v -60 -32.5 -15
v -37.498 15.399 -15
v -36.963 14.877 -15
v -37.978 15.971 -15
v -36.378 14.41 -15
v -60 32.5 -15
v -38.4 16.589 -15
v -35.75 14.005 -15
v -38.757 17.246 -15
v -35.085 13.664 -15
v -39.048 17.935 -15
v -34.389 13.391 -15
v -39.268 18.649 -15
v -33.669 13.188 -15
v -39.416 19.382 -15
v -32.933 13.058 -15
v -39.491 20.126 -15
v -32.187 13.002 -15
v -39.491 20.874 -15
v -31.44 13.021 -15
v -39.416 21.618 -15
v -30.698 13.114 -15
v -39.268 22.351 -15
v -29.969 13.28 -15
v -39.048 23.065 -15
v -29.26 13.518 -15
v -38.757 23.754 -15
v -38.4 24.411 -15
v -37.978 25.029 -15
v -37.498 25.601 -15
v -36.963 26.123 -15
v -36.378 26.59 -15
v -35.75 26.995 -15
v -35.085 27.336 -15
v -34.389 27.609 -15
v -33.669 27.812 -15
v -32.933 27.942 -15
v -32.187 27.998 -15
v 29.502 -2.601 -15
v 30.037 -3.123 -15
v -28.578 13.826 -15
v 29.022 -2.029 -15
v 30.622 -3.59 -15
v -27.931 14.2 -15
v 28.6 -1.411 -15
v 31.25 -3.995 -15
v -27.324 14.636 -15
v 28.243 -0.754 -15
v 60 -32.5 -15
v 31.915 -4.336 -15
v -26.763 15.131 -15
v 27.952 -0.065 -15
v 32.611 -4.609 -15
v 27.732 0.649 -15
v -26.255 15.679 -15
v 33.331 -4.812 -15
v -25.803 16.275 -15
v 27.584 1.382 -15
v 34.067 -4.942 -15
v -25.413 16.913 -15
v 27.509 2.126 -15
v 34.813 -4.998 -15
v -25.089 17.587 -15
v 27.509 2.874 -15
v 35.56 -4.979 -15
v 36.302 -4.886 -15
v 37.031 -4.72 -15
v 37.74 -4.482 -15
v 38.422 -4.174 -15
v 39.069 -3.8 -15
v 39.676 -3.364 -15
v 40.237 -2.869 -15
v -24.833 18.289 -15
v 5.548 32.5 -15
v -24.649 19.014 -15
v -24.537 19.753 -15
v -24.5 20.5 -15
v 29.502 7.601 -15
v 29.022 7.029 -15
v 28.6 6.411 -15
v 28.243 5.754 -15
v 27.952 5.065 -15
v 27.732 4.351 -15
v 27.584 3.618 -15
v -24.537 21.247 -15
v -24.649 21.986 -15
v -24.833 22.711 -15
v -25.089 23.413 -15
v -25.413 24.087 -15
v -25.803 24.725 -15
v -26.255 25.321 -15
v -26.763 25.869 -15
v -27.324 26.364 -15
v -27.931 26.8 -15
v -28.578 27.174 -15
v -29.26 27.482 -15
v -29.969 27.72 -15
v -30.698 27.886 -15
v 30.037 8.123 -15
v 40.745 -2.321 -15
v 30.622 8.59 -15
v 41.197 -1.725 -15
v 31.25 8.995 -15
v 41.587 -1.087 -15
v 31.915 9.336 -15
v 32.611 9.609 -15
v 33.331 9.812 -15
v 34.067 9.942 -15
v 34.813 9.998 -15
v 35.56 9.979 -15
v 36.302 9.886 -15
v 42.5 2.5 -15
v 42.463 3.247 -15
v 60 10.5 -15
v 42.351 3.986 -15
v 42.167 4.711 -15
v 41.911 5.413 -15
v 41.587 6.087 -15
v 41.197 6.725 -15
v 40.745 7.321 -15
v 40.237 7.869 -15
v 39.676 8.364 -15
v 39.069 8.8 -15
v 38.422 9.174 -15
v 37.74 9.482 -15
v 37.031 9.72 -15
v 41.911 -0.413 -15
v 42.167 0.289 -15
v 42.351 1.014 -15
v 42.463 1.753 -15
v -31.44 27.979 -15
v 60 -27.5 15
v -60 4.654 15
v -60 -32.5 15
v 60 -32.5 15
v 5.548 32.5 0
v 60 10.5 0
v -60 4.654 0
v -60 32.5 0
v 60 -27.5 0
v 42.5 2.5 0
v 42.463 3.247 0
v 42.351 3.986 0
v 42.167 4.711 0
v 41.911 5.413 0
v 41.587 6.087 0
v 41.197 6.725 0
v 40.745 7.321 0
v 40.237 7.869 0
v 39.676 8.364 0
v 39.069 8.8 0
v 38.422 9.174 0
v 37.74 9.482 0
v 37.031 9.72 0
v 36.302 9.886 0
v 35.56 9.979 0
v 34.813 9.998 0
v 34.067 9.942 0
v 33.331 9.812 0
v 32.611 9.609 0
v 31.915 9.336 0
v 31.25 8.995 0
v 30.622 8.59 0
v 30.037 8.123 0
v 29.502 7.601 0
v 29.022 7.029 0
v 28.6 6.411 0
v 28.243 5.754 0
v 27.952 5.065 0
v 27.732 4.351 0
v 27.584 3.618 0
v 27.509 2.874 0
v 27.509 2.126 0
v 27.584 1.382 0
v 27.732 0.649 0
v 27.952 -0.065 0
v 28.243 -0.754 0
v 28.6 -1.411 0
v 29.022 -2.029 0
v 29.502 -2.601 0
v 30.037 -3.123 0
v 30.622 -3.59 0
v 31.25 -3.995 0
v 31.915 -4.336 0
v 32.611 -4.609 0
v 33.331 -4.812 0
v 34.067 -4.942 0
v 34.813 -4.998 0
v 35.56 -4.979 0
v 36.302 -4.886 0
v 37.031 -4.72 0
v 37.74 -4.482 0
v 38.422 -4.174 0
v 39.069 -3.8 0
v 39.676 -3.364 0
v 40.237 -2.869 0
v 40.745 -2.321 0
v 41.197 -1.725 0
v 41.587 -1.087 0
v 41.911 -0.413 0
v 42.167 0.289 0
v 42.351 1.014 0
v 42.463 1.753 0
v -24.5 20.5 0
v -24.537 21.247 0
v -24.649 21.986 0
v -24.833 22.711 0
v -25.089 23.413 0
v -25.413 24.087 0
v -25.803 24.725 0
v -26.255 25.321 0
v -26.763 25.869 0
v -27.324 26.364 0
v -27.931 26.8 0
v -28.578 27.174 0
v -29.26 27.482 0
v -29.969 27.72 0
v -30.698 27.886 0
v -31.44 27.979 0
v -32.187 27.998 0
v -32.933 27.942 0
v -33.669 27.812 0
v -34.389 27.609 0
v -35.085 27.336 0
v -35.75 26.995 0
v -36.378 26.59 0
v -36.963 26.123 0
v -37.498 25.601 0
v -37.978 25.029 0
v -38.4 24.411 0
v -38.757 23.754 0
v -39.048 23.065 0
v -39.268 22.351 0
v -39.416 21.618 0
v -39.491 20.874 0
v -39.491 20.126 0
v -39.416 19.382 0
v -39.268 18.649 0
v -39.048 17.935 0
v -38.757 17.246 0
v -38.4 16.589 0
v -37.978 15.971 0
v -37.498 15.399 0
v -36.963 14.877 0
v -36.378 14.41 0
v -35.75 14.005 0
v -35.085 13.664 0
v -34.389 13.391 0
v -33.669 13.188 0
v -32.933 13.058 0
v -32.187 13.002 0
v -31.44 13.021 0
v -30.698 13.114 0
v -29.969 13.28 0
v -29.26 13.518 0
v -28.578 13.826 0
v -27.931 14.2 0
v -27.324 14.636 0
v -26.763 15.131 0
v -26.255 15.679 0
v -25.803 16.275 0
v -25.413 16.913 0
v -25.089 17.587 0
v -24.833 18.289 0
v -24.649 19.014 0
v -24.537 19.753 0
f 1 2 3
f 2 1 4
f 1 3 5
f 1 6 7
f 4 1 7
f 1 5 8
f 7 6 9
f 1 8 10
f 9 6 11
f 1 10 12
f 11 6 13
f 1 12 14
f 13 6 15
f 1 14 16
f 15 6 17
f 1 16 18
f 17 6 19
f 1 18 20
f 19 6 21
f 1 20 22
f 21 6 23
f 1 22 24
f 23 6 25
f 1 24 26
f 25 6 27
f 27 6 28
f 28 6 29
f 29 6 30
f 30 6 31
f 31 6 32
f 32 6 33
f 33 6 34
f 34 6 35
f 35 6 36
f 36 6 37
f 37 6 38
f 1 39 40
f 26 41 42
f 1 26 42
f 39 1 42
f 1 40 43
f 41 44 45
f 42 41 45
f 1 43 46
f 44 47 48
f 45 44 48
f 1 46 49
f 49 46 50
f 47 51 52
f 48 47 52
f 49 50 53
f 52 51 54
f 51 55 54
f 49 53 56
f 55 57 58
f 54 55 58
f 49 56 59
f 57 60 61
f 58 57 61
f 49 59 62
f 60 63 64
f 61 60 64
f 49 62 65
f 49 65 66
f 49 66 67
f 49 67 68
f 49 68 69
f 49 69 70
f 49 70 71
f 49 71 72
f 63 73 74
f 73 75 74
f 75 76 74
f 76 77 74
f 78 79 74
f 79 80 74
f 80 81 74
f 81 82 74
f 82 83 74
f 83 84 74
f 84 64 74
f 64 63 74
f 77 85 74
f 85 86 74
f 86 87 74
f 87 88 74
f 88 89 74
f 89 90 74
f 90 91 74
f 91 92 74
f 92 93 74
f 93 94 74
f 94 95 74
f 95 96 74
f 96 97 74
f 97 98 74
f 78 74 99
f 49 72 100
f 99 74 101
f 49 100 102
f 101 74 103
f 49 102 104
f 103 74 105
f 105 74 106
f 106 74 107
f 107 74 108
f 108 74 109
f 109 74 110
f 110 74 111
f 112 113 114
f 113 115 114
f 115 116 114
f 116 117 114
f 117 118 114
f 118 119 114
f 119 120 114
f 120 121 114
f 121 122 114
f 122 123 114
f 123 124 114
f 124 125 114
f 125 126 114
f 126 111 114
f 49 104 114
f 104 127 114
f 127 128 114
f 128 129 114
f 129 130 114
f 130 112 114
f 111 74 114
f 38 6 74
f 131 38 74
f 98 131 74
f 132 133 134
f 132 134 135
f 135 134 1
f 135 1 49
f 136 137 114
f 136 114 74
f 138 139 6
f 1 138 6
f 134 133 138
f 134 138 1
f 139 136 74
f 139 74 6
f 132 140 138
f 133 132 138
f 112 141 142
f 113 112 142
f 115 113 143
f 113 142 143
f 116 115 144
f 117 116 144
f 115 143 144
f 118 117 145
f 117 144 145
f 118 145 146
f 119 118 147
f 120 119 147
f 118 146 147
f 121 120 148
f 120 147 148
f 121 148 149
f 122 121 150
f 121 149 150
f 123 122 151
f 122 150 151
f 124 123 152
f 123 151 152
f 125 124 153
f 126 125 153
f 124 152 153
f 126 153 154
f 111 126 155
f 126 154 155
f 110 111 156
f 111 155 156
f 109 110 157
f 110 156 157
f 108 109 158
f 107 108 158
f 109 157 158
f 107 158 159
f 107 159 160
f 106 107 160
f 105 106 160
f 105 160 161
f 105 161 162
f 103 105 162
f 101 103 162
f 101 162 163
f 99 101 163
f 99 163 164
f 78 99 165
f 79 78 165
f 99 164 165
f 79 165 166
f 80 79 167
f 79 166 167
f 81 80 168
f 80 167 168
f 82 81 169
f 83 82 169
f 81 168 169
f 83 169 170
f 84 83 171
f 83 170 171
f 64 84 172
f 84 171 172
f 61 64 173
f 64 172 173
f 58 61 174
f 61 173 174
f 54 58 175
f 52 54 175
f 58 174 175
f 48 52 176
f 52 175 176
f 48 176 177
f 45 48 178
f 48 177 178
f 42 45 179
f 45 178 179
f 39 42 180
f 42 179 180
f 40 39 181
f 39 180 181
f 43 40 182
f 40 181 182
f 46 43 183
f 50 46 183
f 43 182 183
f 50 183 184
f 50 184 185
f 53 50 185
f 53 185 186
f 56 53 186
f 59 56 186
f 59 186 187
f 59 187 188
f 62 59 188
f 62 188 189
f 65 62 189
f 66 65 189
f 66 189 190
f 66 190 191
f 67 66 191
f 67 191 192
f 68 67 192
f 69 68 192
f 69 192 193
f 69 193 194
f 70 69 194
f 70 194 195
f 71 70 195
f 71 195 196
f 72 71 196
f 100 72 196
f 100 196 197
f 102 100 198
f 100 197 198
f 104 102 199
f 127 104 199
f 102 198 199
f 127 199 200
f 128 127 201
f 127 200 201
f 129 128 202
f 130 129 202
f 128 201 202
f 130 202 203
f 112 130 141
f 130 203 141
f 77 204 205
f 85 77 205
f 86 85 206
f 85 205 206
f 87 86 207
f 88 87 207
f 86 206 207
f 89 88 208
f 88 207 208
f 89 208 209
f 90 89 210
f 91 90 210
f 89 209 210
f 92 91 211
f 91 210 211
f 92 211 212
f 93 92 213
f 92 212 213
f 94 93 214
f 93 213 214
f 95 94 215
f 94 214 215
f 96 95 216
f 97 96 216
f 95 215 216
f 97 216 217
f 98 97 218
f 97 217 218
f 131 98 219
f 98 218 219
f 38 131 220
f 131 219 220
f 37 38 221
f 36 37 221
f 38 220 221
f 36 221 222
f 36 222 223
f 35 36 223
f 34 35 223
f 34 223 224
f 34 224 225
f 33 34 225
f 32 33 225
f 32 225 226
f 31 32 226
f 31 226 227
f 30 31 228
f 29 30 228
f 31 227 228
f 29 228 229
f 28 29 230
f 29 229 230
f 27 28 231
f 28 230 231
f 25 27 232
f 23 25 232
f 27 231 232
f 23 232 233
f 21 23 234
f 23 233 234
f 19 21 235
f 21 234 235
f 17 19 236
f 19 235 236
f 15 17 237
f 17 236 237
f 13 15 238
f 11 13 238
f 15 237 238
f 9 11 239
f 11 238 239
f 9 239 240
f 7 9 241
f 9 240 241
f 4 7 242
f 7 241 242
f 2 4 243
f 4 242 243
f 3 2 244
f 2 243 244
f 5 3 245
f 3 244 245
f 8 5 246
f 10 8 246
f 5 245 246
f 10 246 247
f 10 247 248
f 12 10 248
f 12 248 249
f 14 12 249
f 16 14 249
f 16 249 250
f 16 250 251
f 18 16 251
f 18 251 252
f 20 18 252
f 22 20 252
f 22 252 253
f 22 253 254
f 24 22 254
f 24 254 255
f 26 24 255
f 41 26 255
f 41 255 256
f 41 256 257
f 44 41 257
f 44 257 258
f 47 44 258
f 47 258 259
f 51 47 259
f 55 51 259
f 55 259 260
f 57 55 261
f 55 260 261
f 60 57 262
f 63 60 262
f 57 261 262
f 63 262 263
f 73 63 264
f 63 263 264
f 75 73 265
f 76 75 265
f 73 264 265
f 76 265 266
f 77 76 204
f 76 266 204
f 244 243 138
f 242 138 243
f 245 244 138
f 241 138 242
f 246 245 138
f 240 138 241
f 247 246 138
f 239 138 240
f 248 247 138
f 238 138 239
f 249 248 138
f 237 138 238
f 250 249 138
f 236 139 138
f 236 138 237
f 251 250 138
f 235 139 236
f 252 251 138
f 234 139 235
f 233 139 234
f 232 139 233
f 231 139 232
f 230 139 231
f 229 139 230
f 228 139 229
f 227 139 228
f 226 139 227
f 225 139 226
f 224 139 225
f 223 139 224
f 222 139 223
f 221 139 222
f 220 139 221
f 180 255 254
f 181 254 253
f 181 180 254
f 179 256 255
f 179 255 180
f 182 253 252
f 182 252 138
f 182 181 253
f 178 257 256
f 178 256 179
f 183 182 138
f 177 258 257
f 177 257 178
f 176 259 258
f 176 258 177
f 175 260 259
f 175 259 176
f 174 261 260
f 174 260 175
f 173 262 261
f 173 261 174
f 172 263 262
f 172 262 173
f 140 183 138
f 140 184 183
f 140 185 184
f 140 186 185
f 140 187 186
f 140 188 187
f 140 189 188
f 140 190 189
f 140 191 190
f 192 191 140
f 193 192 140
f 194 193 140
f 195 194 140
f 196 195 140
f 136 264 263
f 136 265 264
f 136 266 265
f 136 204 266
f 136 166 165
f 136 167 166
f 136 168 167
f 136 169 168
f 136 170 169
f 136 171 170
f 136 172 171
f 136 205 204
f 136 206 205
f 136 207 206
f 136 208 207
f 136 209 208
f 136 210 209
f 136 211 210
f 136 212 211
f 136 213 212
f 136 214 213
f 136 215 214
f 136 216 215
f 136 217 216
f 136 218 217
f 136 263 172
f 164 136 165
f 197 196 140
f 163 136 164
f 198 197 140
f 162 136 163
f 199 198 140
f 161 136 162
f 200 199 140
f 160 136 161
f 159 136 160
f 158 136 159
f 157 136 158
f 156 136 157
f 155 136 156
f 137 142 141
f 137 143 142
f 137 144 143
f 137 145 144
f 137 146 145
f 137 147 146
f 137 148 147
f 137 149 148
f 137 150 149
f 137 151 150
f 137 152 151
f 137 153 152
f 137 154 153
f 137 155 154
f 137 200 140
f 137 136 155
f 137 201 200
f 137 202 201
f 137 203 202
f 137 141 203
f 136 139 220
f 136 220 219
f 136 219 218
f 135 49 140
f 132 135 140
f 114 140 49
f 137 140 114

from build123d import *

# Parameters (mm, degrees)
BOSS_EXTRUDE1_DEPTH = 15
SKETCH1_7_R         = 7.5
BOSS_EXTRUDE5_DEPTH = 15


with BuildPart() as part:
    # Sketch1 → Boss-Extrude1 (new body)
    with BuildSketch(Plane.XY):
        Polygon((60, -32.5), (60, -27.5), (-60, 4.653903092), (-60, -32.5), align=None)
    extrude(amount=BOSS_EXTRUDE1_DEPTH)

    # Sketch1<7> → Boss-Extrude5 (add)
    with BuildSketch(Plane.XY):
        Polygon((60, -32.5), (60, 10.5), (5.548089225, 32.5), (-60, 32.5), (-60, -32.5), align=None)
        with Locations((35, 2.5)):
            Circle(SKETCH1_7_R, mode=Mode.SUBTRACT)
        with Locations((-32, 20.5)):
            Circle(SKETCH1_7_R, mode=Mode.SUBTRACT)
    extrude(amount=-BOSS_EXTRUDE5_DEPTH)


solid = part.part
